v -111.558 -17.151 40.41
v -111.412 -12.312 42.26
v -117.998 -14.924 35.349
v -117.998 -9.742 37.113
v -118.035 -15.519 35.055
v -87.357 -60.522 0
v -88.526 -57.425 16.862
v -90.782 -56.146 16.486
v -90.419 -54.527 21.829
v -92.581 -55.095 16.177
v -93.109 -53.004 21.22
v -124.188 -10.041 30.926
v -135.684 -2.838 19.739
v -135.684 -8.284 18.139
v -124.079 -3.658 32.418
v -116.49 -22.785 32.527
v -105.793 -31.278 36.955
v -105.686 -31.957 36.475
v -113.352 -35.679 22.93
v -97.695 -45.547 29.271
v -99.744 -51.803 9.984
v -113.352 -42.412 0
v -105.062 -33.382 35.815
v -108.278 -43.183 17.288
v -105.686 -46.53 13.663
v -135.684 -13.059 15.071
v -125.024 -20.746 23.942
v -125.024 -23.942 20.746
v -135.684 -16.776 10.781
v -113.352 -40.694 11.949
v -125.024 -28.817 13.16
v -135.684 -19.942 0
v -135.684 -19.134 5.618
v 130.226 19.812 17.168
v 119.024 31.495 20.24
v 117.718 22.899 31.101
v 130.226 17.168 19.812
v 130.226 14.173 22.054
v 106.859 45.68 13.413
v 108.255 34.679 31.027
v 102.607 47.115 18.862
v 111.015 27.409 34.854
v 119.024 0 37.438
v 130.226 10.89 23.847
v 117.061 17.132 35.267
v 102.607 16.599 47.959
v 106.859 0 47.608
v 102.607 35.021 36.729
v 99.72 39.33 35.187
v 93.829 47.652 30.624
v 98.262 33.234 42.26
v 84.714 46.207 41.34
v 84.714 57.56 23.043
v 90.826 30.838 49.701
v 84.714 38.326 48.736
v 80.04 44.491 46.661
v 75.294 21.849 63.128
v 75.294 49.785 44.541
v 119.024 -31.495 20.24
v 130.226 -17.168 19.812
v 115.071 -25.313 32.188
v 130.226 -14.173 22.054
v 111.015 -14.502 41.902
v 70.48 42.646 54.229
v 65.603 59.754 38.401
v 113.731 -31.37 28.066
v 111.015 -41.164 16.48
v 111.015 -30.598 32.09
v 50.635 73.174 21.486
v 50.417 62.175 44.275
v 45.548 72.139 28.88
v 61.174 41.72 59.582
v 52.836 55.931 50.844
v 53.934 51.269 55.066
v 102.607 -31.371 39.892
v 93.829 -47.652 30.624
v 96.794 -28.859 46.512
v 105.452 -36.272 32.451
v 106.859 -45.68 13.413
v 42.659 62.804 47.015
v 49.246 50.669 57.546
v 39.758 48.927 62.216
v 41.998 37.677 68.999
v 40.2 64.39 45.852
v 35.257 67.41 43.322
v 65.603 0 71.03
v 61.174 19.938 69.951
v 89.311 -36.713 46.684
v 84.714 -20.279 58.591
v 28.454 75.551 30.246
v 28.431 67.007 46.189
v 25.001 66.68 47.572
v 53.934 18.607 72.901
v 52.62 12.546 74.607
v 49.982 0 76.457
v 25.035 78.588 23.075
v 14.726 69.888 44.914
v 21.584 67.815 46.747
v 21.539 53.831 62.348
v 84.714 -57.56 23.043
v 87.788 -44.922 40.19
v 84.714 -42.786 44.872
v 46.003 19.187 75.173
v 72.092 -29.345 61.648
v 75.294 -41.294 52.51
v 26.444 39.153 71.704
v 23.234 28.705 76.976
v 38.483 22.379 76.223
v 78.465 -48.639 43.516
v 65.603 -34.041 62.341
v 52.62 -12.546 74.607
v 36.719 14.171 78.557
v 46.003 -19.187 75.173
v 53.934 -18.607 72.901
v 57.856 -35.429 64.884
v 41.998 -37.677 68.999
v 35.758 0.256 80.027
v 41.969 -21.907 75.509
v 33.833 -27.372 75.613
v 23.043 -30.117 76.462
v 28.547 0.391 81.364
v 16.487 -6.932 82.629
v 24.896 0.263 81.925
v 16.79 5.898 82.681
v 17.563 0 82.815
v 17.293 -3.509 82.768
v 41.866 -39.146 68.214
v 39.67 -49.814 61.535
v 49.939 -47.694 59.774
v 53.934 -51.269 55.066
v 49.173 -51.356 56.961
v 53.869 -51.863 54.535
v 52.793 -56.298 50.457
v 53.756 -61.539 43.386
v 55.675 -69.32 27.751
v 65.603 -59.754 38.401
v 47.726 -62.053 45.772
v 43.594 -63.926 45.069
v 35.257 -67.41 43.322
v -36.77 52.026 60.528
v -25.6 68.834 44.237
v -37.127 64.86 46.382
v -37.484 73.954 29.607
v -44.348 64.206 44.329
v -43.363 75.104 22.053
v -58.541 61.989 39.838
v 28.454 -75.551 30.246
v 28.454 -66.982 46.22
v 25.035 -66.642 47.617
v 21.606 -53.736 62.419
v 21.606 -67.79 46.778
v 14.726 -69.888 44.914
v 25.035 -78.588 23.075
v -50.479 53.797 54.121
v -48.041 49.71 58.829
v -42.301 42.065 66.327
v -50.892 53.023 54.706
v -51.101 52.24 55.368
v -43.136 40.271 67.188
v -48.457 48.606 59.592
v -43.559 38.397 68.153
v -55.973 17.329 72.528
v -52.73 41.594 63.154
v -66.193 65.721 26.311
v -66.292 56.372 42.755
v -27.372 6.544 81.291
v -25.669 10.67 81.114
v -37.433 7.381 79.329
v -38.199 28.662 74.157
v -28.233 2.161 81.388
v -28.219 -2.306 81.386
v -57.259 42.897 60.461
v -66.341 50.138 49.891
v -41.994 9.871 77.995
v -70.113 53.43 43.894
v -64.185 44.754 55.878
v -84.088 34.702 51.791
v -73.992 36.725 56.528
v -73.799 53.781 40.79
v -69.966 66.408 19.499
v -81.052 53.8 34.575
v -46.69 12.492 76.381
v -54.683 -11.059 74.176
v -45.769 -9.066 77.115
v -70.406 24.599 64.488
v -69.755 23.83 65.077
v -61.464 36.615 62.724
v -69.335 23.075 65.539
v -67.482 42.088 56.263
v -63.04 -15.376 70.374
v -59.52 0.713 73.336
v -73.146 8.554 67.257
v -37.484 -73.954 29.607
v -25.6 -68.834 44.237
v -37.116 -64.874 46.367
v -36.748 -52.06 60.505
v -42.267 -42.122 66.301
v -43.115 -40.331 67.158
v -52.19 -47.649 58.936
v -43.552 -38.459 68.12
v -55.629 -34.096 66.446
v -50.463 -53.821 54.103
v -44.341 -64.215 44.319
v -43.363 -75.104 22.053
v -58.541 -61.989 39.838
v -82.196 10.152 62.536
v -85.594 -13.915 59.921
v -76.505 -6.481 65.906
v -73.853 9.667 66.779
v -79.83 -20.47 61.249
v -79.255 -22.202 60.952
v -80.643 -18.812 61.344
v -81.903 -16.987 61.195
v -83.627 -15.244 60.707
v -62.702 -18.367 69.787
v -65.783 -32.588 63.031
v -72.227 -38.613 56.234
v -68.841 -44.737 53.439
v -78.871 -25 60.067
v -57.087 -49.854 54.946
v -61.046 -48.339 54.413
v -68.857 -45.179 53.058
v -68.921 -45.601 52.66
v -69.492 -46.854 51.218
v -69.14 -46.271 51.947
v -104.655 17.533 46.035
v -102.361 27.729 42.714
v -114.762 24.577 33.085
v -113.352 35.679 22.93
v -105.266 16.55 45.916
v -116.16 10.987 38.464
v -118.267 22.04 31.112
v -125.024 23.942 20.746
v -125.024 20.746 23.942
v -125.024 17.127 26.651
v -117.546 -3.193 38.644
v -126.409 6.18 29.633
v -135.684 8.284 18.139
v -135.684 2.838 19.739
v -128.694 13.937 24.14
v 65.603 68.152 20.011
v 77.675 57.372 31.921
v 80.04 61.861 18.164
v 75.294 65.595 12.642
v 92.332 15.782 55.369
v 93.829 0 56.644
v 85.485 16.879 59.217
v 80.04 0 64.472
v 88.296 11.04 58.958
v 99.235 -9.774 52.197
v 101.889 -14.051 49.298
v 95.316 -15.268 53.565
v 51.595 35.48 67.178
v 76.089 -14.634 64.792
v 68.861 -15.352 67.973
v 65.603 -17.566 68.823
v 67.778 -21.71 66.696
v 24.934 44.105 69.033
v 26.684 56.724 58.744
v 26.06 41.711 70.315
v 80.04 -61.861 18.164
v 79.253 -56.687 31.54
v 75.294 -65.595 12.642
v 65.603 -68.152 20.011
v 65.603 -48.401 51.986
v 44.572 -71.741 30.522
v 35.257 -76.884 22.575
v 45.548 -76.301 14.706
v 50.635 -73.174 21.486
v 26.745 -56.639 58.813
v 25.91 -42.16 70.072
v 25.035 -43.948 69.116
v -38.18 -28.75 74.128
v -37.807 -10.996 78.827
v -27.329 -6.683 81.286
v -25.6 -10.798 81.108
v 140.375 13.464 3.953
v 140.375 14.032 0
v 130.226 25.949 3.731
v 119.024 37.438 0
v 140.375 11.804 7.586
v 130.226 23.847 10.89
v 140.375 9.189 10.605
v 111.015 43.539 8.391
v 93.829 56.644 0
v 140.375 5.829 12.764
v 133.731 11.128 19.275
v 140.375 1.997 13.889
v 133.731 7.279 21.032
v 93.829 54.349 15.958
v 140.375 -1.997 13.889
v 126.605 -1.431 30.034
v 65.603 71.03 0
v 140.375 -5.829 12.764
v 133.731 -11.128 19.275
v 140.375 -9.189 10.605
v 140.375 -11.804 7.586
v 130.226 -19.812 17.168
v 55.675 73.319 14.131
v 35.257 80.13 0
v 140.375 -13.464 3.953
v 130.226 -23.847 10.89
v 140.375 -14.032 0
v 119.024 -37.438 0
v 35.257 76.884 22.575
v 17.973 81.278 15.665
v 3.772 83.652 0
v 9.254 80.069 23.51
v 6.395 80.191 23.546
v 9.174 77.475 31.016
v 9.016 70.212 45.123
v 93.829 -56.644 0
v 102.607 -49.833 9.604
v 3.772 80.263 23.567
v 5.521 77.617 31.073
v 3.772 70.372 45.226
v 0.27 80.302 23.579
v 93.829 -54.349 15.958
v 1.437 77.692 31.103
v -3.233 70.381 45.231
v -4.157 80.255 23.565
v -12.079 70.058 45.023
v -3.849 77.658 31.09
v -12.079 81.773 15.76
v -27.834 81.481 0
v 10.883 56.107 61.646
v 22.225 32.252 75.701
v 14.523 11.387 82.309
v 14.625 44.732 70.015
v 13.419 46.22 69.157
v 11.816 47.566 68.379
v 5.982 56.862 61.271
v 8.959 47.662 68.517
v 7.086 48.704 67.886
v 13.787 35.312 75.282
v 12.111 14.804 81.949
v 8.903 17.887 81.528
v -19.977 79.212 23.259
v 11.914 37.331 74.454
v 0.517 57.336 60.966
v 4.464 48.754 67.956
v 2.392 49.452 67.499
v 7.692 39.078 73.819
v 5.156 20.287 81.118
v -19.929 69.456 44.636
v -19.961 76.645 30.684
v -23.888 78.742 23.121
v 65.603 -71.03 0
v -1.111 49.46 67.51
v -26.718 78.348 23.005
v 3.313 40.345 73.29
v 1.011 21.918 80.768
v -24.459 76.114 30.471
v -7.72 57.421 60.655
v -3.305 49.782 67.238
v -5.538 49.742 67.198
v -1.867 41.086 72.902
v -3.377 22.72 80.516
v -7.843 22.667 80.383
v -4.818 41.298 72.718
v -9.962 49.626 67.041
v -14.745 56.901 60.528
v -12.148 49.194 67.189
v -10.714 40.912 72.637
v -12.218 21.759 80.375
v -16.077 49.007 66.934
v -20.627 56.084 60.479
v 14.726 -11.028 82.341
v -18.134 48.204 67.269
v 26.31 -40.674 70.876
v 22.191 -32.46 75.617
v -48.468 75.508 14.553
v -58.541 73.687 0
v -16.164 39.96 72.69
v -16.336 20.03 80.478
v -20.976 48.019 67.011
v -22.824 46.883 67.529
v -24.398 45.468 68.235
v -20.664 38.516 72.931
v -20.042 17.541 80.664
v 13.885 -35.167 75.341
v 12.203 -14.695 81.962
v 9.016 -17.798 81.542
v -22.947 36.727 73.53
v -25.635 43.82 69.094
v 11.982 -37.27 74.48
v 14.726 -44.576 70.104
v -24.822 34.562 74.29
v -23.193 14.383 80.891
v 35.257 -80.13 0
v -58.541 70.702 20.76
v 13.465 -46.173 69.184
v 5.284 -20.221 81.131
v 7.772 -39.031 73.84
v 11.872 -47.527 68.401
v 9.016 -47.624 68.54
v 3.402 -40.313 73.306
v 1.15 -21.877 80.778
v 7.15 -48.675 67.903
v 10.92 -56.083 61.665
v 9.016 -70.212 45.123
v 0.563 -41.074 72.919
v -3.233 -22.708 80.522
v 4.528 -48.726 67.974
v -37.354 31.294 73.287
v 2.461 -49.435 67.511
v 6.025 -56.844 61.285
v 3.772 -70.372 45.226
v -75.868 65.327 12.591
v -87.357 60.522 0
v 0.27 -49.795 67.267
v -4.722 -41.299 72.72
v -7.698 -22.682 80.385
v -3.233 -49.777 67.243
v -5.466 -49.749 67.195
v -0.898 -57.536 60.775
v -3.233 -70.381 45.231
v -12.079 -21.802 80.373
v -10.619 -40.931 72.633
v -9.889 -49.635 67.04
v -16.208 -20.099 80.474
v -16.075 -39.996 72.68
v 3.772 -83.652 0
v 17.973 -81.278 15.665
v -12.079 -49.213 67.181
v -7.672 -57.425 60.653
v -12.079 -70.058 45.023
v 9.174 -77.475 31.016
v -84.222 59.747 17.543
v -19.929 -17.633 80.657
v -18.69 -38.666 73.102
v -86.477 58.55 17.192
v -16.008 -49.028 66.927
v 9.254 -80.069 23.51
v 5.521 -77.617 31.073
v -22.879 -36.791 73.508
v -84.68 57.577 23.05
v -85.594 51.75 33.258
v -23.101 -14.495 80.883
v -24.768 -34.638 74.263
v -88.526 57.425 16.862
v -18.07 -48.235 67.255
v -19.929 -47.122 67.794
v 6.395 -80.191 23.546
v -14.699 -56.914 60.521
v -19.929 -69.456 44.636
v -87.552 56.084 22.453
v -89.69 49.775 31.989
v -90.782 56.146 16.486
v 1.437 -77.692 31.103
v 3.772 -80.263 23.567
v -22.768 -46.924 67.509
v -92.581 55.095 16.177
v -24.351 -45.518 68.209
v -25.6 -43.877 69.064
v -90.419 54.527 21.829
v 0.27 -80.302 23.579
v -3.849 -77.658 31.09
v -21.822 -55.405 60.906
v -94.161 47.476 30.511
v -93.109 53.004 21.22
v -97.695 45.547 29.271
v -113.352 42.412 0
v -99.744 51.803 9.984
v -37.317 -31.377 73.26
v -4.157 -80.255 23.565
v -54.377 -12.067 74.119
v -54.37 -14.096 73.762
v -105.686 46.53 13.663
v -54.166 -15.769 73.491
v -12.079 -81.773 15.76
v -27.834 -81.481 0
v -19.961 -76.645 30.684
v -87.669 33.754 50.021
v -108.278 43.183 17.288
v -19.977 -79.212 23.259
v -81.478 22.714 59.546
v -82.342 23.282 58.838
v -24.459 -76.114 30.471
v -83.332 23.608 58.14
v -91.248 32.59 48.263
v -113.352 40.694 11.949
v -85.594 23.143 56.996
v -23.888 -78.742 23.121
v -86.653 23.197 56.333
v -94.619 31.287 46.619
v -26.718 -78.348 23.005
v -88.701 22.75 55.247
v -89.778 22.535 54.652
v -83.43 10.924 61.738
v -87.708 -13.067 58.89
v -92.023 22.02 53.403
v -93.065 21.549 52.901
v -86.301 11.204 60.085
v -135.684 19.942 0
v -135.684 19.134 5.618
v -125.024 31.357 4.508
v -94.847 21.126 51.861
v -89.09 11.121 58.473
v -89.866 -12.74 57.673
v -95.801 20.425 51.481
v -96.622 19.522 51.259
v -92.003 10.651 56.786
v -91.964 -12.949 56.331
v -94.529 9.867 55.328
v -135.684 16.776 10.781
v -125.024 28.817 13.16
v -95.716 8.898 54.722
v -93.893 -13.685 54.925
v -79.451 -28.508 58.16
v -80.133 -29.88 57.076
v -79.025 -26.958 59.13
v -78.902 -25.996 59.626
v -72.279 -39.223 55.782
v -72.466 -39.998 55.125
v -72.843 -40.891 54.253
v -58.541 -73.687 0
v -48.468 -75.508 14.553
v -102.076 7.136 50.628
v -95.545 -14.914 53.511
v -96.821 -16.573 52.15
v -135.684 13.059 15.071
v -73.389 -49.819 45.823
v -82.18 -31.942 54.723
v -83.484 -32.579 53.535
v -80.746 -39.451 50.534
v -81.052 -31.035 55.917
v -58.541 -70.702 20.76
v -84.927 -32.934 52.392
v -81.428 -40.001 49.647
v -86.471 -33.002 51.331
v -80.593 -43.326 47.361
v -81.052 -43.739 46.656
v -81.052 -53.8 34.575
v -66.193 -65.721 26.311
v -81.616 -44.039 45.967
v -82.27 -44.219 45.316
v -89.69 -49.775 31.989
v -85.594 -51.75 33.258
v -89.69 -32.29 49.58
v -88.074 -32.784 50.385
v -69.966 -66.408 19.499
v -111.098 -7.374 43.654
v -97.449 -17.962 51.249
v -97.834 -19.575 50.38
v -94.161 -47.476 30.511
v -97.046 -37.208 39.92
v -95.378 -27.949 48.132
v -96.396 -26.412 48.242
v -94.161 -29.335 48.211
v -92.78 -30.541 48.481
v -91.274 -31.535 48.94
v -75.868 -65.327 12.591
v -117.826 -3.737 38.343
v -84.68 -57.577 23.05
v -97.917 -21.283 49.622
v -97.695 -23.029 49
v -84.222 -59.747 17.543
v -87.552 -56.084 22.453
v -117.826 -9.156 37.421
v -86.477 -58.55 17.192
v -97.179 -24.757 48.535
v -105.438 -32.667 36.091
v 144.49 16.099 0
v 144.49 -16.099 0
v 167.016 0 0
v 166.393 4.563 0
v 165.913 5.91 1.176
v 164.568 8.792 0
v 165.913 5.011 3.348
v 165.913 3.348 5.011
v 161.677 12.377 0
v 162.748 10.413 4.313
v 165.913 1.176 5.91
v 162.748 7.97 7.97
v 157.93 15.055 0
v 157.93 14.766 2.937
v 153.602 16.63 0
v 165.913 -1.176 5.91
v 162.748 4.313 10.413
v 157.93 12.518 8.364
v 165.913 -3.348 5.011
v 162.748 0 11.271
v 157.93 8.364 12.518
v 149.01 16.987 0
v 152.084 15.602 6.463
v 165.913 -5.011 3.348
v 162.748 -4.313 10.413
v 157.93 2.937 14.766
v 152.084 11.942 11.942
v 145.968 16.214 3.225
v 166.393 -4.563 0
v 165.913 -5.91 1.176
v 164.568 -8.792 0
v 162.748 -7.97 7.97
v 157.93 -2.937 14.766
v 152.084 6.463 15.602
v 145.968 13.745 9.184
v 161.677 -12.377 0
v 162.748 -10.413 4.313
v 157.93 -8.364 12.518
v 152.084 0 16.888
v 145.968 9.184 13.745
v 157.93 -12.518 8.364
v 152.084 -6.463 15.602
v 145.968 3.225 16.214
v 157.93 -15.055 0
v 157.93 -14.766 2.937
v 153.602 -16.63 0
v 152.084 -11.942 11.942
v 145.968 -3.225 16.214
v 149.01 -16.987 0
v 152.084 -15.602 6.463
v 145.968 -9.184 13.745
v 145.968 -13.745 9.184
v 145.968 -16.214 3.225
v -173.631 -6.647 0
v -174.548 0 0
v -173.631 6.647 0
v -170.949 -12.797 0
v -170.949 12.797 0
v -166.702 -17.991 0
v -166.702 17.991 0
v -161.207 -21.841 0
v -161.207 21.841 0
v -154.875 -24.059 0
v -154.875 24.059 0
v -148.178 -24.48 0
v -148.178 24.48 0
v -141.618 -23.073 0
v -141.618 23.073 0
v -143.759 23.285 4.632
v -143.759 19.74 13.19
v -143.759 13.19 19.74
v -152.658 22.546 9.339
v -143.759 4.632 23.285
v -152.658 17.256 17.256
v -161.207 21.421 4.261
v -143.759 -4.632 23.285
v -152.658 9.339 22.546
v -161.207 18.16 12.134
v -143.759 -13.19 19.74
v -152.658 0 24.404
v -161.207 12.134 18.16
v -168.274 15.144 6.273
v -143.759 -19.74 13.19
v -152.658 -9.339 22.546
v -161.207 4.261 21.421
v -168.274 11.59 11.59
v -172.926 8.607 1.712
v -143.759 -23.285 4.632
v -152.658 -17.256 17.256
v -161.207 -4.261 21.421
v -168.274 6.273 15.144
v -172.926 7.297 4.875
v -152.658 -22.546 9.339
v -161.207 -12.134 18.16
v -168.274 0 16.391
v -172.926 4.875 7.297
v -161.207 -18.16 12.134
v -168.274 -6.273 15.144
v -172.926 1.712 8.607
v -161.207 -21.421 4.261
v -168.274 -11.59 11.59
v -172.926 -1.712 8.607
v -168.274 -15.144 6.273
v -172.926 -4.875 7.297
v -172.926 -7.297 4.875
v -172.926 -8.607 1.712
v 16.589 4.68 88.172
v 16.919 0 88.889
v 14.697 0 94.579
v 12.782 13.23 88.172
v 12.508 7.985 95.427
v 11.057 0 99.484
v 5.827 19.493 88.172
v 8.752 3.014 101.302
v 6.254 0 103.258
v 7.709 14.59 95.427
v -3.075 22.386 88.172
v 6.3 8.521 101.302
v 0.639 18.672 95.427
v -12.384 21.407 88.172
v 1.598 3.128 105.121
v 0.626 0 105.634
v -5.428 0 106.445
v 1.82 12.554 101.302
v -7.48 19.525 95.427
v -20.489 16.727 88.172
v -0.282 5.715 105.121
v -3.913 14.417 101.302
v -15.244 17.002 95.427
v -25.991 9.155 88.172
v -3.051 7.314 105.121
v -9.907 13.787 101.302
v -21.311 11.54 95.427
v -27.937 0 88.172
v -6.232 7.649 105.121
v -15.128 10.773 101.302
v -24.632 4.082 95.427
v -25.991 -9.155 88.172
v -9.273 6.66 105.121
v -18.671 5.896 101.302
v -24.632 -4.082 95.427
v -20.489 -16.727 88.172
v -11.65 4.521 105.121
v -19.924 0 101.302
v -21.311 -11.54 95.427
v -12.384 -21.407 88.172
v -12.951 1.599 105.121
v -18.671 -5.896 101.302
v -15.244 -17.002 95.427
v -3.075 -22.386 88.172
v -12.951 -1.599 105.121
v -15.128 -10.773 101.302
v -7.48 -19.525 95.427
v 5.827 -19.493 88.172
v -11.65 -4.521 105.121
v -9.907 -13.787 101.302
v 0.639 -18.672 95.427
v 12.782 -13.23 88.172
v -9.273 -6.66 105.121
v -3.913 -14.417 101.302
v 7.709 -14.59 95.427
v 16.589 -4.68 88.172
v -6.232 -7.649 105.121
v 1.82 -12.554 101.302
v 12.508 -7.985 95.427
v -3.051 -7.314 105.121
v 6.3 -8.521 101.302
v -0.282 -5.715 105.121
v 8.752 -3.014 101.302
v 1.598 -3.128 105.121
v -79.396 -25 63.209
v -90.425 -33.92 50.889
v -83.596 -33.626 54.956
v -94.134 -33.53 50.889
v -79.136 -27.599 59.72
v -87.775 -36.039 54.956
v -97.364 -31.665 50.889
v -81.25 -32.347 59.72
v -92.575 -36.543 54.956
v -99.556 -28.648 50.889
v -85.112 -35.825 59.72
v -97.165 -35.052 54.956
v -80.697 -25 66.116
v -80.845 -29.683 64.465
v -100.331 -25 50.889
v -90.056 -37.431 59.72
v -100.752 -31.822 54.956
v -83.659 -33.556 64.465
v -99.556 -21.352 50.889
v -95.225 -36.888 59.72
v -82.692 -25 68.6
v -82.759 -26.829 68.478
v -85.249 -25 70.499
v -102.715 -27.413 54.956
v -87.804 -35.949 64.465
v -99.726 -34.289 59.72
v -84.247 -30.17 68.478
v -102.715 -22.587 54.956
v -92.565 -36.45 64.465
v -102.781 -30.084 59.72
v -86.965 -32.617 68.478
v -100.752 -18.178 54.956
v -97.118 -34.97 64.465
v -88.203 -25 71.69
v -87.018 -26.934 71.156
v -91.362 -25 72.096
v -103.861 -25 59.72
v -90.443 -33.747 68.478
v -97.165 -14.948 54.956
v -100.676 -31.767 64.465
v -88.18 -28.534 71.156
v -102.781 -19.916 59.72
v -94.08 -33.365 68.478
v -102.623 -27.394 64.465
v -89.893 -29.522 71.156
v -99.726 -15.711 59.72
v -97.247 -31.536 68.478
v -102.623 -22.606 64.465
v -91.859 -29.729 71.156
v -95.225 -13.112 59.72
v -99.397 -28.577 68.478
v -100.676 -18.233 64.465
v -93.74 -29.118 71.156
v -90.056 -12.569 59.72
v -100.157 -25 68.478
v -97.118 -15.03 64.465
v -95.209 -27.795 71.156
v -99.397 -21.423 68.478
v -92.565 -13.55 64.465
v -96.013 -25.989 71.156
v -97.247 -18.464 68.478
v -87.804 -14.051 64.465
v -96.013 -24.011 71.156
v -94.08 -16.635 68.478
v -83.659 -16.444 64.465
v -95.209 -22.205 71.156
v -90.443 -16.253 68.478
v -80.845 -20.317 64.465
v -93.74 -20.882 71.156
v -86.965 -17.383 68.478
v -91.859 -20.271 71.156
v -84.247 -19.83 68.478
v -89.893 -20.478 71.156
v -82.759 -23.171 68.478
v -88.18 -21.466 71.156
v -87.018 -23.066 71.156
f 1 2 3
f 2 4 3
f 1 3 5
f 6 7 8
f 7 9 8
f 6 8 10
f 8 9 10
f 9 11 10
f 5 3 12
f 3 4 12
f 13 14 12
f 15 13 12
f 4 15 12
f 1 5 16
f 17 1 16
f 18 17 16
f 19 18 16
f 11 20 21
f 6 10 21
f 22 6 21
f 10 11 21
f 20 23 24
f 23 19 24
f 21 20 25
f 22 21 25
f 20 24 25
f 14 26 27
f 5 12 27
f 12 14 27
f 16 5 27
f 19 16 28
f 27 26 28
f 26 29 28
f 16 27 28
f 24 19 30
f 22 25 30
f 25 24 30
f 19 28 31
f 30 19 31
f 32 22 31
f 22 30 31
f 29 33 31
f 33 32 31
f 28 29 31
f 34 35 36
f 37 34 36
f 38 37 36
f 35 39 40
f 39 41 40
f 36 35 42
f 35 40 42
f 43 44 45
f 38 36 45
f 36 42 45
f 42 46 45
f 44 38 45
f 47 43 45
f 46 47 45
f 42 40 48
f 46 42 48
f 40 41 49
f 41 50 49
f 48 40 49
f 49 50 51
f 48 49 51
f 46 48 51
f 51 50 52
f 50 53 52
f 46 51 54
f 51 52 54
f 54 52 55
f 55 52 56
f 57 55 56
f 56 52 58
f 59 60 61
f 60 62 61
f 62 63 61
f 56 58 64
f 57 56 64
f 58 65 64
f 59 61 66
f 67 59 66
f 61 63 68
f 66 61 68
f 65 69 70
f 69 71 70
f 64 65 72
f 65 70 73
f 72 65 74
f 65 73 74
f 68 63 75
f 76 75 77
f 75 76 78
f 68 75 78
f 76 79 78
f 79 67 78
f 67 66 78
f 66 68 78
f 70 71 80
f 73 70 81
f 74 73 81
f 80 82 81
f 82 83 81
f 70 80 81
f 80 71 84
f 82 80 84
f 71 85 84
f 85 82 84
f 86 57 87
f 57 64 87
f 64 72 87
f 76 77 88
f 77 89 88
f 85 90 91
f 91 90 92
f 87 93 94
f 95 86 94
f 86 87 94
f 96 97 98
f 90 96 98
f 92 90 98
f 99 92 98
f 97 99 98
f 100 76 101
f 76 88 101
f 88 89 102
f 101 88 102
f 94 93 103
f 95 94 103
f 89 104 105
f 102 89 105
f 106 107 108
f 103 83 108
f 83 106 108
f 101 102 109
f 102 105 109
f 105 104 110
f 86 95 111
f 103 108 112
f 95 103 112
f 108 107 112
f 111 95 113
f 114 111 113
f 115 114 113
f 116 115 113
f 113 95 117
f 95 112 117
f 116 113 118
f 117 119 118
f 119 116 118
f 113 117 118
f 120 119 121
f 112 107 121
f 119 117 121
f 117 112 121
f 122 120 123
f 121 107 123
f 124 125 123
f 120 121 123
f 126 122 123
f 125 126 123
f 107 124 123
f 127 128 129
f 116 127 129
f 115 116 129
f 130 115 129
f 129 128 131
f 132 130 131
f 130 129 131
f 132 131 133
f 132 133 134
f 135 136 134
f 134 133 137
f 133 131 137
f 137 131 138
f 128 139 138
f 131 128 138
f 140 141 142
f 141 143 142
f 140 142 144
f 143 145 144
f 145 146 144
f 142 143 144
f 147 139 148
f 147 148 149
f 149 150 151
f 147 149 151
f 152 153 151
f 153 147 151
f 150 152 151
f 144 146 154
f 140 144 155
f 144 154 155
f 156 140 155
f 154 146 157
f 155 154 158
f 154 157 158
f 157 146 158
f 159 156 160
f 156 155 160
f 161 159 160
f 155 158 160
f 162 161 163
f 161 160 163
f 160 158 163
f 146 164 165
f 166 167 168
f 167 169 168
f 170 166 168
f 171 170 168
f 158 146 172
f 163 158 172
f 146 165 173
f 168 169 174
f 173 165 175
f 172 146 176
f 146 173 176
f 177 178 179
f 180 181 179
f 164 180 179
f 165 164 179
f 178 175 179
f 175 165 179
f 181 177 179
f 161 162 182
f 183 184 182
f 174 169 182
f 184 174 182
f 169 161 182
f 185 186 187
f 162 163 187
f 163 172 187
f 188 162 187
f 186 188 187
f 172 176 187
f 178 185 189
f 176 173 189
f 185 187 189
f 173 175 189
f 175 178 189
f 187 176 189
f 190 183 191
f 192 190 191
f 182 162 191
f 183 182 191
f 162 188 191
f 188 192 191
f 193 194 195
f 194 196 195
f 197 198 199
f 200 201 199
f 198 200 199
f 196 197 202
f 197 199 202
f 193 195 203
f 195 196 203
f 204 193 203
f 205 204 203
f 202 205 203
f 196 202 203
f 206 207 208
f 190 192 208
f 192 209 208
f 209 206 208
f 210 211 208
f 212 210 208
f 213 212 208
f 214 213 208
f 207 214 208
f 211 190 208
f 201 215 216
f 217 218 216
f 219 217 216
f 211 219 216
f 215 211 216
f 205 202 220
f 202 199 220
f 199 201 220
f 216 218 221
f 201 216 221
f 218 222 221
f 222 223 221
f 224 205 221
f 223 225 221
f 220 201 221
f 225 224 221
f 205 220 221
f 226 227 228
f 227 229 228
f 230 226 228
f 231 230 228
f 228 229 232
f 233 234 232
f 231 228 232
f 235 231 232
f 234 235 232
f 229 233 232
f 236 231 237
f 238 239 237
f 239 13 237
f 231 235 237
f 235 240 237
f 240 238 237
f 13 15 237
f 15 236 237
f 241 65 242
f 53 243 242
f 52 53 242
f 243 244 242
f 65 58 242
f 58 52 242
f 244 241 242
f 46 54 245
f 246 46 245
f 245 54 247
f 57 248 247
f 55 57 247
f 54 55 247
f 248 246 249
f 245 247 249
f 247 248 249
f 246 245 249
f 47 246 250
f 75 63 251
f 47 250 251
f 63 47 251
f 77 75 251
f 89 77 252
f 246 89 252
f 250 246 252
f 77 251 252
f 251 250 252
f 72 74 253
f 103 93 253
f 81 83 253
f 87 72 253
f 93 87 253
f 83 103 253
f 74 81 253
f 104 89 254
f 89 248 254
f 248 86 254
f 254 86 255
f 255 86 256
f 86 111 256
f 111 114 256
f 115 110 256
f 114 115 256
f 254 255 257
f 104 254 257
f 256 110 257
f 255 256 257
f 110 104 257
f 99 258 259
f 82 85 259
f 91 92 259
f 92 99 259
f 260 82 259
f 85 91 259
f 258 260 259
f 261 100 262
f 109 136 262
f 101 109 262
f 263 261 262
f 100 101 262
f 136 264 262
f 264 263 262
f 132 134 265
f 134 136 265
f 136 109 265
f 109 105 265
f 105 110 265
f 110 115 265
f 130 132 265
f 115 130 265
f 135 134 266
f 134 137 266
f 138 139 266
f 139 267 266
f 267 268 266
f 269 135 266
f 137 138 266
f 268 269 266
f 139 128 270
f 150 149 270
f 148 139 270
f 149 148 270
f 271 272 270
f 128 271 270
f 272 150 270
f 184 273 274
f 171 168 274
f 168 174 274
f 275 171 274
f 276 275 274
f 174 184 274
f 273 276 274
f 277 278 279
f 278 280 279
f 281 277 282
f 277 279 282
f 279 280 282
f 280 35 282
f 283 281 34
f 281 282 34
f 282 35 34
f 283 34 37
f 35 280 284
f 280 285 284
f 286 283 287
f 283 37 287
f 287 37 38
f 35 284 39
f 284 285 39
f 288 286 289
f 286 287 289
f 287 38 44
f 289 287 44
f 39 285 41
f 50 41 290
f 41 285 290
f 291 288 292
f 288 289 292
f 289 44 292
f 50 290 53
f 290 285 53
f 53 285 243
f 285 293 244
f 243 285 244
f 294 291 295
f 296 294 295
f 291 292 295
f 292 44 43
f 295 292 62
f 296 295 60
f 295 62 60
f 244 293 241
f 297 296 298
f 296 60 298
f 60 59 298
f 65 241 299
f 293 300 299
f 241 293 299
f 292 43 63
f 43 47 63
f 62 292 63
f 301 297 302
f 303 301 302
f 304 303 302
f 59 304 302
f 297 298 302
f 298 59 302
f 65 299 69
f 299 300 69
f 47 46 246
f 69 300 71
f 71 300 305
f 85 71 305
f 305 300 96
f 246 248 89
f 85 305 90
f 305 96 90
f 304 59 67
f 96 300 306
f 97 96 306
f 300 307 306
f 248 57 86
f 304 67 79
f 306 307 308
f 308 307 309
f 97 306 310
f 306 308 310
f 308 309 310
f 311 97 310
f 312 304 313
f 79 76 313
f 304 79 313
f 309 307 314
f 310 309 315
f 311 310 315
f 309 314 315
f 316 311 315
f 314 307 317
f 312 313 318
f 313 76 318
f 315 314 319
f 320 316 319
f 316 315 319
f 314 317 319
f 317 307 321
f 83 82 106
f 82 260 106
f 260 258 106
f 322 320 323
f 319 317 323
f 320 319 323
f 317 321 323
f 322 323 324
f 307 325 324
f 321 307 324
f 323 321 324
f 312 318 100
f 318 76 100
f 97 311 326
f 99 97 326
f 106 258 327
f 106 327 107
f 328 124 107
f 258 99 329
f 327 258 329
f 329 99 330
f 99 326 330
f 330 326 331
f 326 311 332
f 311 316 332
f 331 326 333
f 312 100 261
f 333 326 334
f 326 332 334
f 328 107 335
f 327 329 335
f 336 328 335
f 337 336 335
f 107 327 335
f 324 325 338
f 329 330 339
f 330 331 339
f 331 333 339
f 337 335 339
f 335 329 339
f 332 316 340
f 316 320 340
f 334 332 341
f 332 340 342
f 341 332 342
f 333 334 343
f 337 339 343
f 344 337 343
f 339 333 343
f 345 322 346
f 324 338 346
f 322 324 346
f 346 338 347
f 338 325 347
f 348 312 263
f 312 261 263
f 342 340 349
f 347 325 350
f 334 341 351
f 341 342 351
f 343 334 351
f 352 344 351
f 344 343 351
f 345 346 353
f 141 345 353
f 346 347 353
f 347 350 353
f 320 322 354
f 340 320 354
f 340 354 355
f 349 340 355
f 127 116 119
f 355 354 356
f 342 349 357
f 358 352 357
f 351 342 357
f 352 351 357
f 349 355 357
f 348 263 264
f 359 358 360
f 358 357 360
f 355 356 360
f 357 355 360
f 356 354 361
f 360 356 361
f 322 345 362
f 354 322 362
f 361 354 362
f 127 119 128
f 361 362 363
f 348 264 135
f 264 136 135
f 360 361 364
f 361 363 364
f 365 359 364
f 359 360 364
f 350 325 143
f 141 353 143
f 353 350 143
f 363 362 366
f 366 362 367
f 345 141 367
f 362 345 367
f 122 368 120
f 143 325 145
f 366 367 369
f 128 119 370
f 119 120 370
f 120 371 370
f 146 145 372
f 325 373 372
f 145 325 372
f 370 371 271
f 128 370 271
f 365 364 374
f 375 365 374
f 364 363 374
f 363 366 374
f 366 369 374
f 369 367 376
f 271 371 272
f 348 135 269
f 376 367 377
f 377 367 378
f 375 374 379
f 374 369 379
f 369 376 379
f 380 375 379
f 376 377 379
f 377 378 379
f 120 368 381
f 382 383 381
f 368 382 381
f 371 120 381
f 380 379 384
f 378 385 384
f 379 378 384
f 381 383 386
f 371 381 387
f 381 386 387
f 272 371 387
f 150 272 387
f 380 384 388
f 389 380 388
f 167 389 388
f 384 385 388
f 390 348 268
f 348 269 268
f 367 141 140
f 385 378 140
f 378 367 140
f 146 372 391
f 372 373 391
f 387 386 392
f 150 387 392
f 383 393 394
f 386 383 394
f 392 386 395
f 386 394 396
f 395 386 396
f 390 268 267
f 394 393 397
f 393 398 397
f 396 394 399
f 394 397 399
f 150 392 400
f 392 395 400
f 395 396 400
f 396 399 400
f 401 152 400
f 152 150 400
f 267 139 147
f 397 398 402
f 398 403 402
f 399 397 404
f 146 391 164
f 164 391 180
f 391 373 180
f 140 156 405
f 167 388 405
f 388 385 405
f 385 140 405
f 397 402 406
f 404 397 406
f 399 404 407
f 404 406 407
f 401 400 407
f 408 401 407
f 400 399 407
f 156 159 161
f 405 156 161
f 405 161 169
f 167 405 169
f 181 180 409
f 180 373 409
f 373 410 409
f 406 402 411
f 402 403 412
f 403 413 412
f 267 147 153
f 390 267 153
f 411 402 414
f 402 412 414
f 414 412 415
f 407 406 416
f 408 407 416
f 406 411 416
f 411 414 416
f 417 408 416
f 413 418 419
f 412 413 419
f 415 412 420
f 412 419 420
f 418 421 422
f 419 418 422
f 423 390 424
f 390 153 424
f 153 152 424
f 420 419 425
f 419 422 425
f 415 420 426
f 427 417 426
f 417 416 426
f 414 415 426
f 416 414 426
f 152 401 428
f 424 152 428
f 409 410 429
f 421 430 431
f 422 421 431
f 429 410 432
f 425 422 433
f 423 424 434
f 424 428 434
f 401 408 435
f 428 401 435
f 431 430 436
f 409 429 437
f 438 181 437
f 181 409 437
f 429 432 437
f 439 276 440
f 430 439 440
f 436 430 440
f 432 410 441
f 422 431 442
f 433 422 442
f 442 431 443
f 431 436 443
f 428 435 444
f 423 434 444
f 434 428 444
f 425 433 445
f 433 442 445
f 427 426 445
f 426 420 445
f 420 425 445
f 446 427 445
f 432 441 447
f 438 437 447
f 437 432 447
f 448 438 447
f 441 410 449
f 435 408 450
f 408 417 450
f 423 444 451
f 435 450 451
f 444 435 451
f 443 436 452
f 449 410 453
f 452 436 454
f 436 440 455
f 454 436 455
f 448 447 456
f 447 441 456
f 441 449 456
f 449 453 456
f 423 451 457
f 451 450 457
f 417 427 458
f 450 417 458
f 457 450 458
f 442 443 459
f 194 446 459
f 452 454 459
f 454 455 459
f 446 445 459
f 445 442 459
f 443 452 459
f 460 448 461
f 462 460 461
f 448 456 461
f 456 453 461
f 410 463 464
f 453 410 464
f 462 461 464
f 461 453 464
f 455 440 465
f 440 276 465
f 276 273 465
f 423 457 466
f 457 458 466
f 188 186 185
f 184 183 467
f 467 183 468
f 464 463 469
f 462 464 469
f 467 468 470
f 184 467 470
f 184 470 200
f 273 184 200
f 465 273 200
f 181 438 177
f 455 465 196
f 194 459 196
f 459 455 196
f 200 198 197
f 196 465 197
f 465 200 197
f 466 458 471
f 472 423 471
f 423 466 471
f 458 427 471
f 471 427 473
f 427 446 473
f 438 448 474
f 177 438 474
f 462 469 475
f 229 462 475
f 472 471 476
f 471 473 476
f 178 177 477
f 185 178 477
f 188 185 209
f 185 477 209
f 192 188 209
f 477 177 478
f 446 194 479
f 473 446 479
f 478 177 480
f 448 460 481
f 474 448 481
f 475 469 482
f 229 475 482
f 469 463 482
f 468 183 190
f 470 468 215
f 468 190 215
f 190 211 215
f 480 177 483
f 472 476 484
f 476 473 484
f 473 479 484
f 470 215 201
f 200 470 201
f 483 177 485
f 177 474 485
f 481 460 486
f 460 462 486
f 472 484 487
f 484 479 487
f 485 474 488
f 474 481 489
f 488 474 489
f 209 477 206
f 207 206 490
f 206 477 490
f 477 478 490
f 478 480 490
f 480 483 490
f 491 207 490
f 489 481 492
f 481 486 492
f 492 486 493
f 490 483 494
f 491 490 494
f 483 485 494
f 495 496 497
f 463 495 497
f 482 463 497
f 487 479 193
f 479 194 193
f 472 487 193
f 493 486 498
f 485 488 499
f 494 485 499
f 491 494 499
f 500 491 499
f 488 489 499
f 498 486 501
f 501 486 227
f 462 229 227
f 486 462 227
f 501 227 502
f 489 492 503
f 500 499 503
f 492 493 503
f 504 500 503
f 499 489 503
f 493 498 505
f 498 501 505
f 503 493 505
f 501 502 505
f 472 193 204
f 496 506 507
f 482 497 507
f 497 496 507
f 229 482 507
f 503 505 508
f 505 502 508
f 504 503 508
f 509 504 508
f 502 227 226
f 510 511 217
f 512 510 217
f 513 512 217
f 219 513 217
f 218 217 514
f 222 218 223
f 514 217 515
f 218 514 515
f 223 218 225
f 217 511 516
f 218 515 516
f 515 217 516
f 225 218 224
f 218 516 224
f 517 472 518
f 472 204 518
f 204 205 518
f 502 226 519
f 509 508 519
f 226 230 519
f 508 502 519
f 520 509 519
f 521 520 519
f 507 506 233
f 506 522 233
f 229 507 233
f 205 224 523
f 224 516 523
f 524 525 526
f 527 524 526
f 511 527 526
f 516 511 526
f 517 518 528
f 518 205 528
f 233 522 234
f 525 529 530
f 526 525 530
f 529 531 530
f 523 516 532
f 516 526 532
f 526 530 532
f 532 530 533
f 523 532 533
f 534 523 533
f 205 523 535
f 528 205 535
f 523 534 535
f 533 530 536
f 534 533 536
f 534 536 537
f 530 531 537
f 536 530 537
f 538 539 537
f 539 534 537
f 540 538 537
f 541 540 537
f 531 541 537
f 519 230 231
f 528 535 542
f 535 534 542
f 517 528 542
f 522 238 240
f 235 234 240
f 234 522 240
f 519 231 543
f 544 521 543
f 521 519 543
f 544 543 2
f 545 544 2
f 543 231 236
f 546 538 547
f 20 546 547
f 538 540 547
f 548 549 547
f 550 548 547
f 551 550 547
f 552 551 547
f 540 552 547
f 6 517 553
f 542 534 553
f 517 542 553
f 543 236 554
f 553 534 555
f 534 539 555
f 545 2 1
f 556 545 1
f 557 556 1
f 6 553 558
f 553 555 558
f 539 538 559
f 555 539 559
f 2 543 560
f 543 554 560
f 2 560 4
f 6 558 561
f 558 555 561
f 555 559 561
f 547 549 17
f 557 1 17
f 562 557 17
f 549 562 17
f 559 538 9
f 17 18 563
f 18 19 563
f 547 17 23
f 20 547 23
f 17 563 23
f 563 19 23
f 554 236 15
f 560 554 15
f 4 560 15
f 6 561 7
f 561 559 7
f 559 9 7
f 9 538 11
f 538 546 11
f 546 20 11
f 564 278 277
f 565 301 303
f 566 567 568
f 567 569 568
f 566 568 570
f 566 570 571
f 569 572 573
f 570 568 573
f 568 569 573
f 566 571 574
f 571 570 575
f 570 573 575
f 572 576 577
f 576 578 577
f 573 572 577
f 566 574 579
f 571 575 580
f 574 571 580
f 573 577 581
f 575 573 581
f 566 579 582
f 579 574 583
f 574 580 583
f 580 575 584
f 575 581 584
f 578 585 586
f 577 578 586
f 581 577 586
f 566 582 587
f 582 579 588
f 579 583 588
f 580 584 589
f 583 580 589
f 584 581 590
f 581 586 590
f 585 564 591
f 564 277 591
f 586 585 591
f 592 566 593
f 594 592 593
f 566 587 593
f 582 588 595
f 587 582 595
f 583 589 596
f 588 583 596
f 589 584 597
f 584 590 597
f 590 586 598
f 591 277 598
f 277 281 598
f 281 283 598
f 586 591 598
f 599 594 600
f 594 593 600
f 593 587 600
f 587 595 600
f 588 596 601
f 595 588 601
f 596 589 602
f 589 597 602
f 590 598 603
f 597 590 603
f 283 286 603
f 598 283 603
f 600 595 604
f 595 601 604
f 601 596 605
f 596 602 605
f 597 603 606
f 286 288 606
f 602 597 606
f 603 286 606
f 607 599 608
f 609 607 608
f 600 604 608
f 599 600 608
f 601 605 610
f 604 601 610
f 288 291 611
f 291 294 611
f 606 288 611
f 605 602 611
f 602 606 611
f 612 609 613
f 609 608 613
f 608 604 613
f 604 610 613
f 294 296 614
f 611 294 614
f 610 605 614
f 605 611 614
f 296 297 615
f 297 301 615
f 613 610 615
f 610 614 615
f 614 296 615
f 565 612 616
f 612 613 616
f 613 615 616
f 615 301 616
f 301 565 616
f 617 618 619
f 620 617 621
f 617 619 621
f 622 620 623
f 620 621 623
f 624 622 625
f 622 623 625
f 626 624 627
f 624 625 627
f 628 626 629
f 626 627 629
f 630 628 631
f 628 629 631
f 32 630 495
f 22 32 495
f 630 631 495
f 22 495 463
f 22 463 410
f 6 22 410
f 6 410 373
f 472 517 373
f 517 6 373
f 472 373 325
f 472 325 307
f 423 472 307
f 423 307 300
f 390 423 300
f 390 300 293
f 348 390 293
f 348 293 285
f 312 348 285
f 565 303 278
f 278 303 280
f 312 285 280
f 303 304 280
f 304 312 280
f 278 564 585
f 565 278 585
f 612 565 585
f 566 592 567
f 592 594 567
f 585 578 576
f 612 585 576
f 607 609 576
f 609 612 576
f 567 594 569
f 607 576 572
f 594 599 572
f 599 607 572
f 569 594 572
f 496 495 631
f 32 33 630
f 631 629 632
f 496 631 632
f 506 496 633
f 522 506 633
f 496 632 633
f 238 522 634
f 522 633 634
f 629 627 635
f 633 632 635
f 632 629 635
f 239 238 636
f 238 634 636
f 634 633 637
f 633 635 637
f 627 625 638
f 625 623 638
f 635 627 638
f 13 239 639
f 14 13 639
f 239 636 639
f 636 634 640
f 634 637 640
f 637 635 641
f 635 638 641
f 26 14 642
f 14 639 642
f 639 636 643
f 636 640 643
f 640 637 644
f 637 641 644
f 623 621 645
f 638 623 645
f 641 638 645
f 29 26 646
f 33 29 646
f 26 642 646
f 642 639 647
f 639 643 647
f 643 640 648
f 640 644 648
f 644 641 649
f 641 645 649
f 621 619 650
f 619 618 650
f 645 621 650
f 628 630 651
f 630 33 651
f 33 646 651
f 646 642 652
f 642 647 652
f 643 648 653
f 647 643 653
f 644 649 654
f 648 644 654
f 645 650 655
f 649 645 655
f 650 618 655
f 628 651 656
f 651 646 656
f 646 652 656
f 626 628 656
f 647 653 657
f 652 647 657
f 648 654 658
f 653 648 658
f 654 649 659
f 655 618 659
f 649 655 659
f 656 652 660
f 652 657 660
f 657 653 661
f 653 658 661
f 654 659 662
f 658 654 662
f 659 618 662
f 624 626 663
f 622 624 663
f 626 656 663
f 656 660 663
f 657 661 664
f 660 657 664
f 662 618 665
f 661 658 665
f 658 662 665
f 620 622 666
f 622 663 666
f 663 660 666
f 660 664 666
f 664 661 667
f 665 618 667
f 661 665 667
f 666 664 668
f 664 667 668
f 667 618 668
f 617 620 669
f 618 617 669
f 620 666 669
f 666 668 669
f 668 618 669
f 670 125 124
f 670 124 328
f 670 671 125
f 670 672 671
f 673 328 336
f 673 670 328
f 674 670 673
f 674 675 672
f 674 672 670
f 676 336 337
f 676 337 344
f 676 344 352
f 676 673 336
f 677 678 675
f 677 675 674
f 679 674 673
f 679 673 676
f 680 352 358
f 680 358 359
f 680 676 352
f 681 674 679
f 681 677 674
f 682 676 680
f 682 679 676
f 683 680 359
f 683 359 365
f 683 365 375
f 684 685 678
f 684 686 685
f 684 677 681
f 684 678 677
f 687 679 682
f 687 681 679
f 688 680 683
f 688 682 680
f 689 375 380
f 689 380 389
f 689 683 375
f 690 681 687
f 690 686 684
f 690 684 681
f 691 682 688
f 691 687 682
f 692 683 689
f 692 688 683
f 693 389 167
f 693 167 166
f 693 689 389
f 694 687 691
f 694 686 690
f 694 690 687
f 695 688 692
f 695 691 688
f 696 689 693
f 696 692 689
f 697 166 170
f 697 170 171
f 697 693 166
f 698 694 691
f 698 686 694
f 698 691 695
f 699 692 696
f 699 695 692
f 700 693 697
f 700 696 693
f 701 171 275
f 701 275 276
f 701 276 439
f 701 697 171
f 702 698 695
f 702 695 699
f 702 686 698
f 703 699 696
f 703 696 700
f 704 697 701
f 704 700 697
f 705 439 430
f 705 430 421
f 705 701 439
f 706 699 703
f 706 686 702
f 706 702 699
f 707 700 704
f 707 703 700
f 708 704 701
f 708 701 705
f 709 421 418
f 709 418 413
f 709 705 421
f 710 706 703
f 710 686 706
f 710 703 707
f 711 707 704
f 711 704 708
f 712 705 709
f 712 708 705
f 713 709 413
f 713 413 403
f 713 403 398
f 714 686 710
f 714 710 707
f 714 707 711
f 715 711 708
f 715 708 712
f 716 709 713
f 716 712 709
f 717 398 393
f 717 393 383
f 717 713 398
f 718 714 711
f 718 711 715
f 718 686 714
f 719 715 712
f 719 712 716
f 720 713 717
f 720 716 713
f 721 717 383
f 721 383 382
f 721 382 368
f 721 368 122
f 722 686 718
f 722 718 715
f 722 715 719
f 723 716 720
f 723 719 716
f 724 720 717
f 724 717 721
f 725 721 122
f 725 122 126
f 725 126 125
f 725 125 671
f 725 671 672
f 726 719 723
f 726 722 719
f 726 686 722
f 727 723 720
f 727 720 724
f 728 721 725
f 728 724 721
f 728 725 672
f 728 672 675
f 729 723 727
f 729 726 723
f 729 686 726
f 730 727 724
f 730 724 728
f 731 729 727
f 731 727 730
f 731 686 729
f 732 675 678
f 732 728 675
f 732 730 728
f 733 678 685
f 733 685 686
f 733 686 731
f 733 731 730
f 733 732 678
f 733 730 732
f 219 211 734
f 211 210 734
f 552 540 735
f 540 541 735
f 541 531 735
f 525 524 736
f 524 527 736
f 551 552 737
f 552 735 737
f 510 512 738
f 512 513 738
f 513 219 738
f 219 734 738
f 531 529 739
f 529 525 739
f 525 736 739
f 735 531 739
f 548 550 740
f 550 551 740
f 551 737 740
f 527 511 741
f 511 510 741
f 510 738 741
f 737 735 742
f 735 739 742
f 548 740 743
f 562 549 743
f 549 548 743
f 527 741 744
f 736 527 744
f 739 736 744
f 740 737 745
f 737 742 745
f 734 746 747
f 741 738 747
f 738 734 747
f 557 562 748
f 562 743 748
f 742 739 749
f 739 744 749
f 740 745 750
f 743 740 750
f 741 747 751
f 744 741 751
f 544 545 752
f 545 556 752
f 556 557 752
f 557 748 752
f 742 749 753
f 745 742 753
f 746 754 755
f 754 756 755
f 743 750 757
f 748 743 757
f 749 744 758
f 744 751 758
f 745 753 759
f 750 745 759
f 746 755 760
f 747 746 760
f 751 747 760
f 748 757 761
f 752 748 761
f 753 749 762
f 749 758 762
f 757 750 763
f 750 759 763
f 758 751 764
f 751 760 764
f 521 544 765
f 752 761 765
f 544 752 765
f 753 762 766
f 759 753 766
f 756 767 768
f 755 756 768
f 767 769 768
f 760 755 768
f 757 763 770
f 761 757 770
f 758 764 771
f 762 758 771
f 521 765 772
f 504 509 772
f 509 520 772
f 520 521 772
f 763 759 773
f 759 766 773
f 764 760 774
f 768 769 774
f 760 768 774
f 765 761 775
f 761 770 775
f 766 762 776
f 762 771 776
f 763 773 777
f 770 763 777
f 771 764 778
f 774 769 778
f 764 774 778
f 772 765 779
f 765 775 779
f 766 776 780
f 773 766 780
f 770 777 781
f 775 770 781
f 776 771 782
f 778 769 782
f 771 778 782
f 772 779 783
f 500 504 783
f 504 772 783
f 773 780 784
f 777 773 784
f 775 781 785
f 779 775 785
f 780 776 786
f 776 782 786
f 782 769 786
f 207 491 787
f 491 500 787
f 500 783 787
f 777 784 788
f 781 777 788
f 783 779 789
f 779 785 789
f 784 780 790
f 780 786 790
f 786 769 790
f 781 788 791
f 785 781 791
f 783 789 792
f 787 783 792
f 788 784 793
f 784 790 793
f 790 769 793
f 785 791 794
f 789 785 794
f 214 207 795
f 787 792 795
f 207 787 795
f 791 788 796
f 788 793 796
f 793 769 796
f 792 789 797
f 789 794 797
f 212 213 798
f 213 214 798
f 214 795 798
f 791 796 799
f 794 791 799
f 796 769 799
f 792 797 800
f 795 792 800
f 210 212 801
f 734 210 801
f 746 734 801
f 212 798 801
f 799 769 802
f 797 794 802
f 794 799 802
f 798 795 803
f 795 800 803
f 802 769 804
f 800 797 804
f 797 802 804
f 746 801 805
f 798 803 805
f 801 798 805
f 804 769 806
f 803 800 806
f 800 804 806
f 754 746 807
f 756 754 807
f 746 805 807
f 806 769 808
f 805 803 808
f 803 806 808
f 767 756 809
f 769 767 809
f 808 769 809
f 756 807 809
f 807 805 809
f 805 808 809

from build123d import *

# Parameters (mm, degrees)
F1_ANGLE_BACK = 90
F1_ANGLE      = 180


with BuildPart() as f1:
    # F0 (on Front) → F1 (revolve)
    with BuildSketch(Plane.XZ, mode=Mode.PRIVATE) as f1_sk:
        with BuildLine():
            Line((-174.5481213674, 0), (-125.4518786326, 0))
            Line((-125.4518786326, 0), (0, 0))
            Line((0, 0), (150, 0))
            Line((150, 0), (167.0159689891, 0))
            ThreePointArc((167.0159689891, 0), (157.9297031271, 15.055331579), (140.3747581242, 14.0320319081))
            ThreePointArc((140.3747581242, 14.0320319081), (3.7724218582, 83.6518636745), (-135.6840638443, 19.9415203696))
            ThreePointArc((-135.6840638443, 19.9415203696), (-161.2067150501, 21.8407829633), (-174.5481213674, 0))
        make_face()
    revolve(f1_sk.sketch.rotate(Axis((75, 0, 0), (1, 0, 0)), -F1_ANGLE_BACK), axis=Axis((75, 0, 0), (1, 0, 0)), revolution_arc=F1_ANGLE)

    # F2 (on Front) → F3 (revolve)
    with BuildSketch(Plane.XZ):
        with BuildLine():
            Line((-5.4278934686, 106.4453259364), (-5.4278934686, 83.4453259364))
            Line((-5.4278934686, 83.4453259364), (-5.4278934686, 60.4453259364))
            ThreePointArc((-5.4278934686, 60.4453259364), (17.5721065314, 83.4453259364), (-5.4278934686, 106.4453259364))
        make_face()
    revolve(axis=Axis((-5.4278934686, 0, 94.9453259364), (0, 0, 1)))

    # F5 (on offset) → F6 (revolve)
    with BuildSketch(Plane.XZ.offset(25)):
        with BuildLine():
            Line((-91.3620953561, 72.0958850223), (-91.3620953561, 47.0958850223))
            ThreePointArc((-91.3620953561, 47.0958850223), (-78.8620953561, 59.5958850223), (-91.3620953561, 72.0958850223))
        make_face()
    revolve(axis=Axis((-91.3620953561, -25, 59.5958850223), (0, 0, -1)))


solid = f1.part
